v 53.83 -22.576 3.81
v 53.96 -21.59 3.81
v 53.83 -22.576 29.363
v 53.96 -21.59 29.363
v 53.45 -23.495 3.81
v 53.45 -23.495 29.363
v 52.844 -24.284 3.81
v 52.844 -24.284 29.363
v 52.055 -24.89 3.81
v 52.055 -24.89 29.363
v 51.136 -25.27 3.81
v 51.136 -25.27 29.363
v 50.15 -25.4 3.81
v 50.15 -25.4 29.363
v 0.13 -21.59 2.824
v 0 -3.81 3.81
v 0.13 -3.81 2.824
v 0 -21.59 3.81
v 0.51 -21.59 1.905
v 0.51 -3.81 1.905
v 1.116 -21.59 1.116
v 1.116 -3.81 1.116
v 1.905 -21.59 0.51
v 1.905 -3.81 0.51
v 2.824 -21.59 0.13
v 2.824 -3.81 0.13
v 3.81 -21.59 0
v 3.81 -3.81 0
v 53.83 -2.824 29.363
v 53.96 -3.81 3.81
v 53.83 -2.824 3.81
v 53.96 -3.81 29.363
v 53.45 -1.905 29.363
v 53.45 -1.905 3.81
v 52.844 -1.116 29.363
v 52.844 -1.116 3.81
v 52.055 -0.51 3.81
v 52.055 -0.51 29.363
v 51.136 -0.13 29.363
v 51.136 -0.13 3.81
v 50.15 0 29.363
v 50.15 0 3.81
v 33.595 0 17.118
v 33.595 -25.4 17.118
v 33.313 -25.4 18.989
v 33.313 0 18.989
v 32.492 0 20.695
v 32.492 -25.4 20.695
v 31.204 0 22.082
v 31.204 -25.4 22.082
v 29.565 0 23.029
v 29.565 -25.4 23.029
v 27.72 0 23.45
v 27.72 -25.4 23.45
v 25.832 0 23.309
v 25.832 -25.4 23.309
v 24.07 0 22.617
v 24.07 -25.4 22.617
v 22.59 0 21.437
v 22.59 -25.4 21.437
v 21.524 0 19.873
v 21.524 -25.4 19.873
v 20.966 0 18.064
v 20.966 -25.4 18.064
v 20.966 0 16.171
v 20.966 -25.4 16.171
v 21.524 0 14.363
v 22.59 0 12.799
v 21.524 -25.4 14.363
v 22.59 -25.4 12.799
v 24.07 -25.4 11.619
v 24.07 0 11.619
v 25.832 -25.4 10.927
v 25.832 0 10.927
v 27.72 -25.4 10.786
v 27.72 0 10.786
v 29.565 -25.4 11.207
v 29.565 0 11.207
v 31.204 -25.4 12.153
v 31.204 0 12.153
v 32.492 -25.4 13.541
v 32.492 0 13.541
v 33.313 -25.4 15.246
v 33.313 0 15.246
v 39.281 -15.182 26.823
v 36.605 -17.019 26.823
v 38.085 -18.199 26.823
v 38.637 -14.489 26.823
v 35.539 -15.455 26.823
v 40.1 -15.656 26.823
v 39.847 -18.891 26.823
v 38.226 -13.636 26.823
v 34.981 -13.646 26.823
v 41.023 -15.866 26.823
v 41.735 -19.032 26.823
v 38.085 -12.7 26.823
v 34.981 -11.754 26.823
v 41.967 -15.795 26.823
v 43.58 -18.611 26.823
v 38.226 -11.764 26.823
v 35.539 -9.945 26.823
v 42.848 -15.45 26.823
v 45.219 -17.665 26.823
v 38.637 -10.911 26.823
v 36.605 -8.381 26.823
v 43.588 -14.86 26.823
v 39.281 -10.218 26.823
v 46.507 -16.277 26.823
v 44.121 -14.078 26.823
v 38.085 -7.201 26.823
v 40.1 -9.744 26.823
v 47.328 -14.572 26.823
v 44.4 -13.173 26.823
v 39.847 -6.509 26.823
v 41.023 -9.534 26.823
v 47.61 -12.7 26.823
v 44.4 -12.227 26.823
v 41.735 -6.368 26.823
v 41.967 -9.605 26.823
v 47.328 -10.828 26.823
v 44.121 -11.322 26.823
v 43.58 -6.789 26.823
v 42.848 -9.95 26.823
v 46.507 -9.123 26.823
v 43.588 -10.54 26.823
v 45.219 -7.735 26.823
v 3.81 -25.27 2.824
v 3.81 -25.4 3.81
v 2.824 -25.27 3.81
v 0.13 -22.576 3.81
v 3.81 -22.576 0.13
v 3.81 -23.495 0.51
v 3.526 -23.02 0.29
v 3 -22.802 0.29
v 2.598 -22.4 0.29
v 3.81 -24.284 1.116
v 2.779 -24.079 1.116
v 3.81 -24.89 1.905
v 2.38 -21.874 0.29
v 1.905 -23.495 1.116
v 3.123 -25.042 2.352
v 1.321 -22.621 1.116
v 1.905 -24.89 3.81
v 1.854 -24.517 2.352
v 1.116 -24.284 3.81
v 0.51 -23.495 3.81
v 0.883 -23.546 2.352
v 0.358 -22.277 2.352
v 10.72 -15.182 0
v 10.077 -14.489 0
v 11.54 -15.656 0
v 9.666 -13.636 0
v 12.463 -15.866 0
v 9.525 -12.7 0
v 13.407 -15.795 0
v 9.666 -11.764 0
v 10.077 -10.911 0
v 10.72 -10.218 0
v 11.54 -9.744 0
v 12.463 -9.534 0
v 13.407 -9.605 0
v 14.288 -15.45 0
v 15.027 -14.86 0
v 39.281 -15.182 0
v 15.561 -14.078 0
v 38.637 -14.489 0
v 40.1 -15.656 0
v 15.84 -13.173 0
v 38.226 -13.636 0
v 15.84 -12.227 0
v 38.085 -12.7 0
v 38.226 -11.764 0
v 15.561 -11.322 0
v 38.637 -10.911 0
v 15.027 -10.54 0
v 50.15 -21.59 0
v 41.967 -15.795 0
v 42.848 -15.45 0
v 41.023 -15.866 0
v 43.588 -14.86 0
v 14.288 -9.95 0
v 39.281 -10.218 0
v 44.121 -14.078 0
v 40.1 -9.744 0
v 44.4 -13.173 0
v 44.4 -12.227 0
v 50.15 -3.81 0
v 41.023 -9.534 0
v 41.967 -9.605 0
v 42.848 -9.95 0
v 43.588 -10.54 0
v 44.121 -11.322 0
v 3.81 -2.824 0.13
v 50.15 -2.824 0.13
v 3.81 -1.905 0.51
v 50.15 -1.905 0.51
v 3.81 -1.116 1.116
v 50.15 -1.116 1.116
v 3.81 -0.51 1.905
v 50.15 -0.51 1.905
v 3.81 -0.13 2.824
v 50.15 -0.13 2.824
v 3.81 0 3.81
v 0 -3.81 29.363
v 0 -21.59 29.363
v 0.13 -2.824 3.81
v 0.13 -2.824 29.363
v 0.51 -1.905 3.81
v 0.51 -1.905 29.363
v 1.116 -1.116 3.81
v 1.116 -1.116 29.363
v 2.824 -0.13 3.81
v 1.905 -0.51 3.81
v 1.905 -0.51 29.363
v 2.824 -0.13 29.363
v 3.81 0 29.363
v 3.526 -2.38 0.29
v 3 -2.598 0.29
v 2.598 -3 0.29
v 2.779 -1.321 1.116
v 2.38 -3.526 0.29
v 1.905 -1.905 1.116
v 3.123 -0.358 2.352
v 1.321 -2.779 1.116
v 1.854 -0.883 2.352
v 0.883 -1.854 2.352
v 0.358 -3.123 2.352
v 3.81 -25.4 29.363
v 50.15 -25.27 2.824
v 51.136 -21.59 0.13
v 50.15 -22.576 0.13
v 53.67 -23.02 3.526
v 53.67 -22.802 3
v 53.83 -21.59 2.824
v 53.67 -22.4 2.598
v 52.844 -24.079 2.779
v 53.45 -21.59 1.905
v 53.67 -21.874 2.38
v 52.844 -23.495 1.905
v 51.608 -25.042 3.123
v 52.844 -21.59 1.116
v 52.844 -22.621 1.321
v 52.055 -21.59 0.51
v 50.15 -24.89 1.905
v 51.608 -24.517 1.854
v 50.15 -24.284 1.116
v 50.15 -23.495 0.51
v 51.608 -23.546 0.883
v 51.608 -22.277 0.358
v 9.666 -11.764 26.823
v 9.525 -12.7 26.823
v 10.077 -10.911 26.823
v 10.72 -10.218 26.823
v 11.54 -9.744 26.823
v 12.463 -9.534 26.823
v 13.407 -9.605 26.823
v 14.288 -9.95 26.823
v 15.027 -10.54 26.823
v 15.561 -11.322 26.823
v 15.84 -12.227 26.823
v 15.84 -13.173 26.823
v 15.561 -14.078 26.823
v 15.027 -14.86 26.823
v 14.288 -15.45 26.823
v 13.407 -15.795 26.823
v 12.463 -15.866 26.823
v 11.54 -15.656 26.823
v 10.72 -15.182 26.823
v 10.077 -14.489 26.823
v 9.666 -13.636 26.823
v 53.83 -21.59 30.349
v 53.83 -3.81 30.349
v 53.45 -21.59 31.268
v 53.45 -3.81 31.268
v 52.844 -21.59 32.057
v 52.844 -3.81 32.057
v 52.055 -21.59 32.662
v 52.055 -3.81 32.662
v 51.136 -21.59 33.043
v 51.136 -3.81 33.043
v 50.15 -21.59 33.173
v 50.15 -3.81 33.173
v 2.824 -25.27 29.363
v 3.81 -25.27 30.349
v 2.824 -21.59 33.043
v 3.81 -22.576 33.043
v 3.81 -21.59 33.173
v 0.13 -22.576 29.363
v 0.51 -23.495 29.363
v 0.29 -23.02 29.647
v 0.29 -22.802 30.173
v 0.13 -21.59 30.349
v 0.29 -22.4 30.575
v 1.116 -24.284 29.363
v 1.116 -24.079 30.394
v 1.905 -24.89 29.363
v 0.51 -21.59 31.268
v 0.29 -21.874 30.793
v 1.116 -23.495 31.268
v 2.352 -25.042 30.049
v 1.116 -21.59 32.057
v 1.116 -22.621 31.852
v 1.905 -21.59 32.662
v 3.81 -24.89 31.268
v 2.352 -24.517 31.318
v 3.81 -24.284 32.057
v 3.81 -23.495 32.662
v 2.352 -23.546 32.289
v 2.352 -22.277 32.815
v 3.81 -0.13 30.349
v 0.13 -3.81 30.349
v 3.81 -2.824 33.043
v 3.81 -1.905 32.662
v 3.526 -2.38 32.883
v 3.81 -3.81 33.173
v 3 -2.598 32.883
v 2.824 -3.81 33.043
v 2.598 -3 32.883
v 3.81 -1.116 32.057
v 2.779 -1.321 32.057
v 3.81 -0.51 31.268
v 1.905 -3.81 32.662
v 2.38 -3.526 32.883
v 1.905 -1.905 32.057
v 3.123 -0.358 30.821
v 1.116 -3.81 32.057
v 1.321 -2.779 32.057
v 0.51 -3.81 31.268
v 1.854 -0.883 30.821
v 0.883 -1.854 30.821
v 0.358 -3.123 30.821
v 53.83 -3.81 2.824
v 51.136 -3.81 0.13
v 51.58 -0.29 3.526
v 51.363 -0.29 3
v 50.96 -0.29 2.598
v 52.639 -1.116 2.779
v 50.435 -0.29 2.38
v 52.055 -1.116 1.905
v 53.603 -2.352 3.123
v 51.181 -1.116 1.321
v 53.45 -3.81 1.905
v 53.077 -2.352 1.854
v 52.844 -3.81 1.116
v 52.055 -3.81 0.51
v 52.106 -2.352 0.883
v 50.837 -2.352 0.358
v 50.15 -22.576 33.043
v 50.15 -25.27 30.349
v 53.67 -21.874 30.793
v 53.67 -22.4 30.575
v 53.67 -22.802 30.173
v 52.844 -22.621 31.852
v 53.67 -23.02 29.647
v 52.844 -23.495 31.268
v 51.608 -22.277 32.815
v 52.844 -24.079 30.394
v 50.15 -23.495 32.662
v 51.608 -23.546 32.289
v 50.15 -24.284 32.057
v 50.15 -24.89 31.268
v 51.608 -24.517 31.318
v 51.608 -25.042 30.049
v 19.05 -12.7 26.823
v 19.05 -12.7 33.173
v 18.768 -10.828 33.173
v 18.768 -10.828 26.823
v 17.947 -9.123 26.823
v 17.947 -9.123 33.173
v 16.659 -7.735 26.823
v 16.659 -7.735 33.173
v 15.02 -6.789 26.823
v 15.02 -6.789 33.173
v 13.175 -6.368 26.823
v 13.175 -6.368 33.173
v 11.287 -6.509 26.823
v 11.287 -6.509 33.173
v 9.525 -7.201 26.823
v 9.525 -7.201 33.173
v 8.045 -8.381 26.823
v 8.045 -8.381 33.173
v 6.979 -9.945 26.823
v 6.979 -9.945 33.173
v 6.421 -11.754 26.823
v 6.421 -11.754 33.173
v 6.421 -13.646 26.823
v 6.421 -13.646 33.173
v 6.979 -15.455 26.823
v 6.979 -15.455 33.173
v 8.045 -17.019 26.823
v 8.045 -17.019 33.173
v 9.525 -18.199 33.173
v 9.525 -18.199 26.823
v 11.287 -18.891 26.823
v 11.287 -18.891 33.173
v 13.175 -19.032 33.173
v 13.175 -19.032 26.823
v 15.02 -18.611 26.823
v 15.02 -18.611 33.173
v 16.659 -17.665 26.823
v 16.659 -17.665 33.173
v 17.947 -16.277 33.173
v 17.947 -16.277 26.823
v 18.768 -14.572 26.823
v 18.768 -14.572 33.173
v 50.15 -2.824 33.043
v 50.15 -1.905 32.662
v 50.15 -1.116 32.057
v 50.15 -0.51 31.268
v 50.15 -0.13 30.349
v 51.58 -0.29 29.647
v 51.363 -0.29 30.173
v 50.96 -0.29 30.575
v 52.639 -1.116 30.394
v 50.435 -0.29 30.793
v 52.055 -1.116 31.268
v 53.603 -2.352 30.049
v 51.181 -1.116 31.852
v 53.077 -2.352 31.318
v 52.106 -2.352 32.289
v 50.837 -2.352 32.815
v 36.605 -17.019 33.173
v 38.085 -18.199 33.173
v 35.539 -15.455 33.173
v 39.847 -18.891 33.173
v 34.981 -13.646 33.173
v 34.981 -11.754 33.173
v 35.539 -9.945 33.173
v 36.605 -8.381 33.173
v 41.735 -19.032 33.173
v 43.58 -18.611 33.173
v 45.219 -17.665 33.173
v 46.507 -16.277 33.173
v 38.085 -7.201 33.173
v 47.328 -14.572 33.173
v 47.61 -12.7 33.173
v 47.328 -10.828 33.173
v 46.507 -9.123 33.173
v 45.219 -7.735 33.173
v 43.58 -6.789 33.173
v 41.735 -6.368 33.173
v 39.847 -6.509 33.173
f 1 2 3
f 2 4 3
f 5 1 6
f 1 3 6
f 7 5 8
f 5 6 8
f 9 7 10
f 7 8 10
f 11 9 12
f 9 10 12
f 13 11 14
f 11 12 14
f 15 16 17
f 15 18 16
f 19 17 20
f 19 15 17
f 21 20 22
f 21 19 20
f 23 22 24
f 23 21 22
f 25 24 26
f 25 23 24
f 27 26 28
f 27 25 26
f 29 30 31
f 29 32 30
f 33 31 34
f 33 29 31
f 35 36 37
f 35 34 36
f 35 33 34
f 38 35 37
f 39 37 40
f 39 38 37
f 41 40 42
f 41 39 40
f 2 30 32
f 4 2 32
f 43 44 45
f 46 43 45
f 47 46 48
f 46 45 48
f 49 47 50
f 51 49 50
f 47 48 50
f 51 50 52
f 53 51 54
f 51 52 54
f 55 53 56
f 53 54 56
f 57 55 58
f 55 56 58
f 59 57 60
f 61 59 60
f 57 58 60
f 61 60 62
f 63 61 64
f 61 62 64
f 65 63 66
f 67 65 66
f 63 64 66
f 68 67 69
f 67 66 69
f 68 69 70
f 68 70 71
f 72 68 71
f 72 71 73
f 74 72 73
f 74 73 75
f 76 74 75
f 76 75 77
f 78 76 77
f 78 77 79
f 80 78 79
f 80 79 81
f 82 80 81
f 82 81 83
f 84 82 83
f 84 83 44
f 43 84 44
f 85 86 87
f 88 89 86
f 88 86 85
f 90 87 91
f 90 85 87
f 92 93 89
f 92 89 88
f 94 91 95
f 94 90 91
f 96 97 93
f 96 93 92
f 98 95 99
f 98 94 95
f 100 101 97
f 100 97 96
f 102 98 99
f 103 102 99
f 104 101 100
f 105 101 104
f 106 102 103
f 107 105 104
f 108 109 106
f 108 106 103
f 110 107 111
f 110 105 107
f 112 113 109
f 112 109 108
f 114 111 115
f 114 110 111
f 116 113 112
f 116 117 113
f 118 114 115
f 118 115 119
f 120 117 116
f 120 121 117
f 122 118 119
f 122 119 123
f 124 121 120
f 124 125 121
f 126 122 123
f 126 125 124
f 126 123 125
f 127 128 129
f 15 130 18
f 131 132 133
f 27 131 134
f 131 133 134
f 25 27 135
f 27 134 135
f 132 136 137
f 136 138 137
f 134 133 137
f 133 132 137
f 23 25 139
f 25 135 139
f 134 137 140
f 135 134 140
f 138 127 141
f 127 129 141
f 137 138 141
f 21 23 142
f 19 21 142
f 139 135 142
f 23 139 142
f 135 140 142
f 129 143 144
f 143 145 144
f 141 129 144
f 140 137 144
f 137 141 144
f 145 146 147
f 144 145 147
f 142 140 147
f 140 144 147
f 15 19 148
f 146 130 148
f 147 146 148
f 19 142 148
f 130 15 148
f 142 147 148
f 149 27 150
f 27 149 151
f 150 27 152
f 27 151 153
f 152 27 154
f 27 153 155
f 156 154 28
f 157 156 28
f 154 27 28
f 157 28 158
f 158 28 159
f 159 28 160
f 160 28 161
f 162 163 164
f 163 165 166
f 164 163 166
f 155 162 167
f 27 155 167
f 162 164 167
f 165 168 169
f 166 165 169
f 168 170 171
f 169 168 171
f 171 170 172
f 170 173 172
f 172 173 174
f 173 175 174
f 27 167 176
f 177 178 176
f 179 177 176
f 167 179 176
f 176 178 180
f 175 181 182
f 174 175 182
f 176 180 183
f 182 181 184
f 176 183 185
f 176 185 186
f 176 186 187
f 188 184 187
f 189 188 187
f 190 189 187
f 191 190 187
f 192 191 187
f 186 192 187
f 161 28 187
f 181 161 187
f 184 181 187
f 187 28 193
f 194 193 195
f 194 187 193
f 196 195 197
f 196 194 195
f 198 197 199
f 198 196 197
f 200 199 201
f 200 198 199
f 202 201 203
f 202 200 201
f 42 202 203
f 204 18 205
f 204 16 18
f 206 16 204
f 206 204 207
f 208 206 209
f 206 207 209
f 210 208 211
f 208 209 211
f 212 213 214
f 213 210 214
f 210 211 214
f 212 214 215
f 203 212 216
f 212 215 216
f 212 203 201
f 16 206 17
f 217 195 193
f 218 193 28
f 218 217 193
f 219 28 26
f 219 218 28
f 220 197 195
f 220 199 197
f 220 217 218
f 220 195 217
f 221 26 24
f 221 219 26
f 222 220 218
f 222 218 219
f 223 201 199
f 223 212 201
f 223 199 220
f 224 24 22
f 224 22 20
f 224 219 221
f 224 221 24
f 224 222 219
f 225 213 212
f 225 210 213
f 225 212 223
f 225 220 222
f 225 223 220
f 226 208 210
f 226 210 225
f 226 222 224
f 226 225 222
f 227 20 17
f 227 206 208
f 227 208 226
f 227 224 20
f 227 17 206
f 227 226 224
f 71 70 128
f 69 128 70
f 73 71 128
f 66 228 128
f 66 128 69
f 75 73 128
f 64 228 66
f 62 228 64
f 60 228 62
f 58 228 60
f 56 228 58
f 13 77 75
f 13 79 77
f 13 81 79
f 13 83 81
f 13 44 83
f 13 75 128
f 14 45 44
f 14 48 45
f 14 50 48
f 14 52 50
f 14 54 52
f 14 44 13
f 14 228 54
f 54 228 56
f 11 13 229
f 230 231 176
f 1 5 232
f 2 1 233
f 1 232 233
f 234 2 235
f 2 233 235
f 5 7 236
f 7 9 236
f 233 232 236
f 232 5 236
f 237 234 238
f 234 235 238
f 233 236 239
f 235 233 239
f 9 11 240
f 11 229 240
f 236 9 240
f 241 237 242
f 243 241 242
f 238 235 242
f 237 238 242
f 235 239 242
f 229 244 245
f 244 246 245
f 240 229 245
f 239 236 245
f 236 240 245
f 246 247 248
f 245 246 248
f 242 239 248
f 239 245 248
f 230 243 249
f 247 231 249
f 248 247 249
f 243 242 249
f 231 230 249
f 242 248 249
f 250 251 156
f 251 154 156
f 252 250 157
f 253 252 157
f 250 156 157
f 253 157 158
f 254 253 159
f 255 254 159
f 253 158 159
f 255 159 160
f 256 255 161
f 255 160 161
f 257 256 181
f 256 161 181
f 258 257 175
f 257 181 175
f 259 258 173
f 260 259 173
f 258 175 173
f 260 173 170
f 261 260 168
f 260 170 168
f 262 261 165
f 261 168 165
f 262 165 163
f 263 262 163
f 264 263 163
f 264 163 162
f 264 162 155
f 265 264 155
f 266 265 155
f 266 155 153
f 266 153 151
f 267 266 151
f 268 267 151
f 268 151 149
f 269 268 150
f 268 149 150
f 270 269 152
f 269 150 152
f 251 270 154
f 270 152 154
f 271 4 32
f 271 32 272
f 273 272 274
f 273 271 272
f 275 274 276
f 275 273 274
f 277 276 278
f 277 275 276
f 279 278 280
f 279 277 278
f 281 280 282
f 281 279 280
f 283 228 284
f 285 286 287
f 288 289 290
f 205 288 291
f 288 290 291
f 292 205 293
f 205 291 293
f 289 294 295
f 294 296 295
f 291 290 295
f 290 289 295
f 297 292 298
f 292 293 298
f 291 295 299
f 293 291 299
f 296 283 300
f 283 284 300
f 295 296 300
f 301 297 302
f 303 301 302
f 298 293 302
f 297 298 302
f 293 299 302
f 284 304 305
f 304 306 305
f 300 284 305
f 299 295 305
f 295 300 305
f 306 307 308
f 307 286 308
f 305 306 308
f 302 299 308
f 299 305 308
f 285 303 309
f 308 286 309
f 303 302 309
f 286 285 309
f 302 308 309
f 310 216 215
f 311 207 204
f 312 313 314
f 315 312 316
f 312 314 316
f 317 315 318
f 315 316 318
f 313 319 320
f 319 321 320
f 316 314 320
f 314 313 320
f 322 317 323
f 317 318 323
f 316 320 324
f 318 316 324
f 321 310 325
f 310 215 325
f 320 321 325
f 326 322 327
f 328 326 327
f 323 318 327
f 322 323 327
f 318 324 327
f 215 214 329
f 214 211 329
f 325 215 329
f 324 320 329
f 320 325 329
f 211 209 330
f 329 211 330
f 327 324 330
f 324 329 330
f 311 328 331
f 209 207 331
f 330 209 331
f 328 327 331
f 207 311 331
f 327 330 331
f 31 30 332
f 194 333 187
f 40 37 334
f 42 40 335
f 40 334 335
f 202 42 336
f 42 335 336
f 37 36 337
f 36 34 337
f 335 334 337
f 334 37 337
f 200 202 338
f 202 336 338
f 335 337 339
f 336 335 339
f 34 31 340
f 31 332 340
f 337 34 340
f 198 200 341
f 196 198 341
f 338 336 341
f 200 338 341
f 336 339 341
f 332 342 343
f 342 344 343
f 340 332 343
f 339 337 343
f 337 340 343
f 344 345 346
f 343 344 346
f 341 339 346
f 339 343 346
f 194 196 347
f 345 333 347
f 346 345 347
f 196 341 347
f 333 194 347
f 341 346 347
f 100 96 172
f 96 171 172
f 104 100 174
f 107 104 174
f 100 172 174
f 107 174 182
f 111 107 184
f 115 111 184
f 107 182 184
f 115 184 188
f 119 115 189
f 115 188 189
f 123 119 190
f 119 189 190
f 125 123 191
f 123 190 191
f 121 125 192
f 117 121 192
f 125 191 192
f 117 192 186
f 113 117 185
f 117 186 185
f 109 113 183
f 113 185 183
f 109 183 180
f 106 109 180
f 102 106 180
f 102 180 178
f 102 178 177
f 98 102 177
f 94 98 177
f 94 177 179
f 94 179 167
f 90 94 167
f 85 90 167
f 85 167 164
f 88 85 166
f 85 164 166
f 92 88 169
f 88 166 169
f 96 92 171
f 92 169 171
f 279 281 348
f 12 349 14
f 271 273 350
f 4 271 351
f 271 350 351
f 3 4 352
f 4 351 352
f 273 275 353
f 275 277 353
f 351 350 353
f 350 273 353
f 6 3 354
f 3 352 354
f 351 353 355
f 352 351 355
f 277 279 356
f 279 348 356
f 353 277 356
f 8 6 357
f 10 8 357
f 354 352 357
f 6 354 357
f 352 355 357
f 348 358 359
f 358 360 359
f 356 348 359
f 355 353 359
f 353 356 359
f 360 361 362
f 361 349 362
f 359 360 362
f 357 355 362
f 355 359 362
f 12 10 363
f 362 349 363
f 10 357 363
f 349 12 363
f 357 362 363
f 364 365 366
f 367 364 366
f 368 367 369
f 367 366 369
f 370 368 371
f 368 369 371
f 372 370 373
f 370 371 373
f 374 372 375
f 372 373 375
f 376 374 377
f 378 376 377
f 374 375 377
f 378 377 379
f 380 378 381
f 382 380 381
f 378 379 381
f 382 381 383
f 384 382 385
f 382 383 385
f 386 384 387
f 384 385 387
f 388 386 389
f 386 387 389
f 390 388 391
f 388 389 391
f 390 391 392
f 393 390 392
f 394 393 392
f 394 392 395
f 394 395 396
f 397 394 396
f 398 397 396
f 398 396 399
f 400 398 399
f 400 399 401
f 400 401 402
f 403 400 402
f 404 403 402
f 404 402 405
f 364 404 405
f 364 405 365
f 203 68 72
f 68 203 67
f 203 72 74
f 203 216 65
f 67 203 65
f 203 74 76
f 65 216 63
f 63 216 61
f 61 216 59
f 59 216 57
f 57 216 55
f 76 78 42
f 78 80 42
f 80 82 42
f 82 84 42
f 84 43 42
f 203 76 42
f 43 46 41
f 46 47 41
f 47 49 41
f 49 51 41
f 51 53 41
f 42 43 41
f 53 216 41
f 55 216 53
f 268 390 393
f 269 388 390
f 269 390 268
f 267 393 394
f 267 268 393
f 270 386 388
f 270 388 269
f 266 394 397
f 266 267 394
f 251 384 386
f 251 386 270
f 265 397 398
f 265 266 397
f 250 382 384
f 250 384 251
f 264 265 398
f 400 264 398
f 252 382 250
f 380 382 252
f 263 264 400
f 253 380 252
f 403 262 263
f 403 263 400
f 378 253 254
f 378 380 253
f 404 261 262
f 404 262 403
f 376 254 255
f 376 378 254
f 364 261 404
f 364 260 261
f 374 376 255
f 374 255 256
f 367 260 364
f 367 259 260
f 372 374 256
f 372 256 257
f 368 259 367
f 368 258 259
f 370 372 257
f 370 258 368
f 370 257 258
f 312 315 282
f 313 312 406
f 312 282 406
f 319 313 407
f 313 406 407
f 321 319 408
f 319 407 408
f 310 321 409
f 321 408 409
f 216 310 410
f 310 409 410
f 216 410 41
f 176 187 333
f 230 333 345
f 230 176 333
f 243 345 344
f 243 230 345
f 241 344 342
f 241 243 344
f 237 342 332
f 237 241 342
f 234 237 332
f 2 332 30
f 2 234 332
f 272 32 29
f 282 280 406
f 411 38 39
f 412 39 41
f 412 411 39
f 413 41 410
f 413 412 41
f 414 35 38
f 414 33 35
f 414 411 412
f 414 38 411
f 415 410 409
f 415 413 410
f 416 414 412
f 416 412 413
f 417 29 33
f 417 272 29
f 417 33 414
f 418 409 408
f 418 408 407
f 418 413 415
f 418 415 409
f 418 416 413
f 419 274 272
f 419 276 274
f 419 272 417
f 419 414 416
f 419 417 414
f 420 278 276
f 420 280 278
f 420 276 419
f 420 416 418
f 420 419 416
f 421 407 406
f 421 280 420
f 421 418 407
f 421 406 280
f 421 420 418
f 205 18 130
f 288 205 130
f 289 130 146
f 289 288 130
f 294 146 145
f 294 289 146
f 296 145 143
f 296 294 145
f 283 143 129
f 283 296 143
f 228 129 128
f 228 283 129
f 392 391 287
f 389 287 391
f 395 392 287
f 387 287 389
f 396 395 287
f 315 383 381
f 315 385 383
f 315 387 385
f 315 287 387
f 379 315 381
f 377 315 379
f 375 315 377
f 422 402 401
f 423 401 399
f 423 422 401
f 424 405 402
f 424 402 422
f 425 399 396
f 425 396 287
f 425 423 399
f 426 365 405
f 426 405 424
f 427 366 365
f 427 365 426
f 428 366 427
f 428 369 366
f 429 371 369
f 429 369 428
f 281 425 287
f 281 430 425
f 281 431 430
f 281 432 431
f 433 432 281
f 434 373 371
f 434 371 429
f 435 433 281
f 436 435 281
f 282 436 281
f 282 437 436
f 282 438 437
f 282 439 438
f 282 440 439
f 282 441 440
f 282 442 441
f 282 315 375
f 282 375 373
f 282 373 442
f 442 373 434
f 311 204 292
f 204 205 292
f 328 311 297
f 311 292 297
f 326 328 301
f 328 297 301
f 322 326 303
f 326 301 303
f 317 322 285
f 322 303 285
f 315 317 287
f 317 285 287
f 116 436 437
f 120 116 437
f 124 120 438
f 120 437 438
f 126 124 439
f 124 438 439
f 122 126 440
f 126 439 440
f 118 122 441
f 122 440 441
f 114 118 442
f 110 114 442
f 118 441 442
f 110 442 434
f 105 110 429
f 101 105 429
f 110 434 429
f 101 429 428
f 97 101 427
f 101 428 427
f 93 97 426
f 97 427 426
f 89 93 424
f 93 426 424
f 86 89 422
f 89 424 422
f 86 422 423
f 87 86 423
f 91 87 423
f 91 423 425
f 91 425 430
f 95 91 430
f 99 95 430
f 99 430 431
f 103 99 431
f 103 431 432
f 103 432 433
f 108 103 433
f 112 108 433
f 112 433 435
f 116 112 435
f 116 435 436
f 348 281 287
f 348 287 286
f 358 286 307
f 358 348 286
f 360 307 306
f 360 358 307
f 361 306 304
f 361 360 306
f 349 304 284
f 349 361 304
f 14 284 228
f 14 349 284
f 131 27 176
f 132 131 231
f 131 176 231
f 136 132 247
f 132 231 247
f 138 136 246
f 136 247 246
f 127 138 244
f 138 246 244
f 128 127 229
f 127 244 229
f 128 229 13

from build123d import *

# Parameters (mm, degrees)
F0_W           = 53.960219
F0_H           = 33.172701
F1_DEPTH       = 25.4
F2_R           = 3.81
F3_R           = 6.35
F4_DEPTH       = 25.401
F6_D           = 6.35
F6_CBORE_D     = 12.7
F6_CBORE_DEPTH = 6.35


with BuildPart() as f1:
    # F0 (on Front) → F1 (new body)
    with BuildSketch(Plane.XZ):
        with Locations((26.980109, 16.58635)):
            Rectangle(F0_W, F0_H)
    extrude(amount=F1_DEPTH)

    # F2
    f2_edges = [f1.edges().sort_by_distance(p)[0] for p in [
        (26.98011, -25.4, 33.172701),
        (53.960219, -12.7, 33.172701),
        (0, -25.4, 16.58635),
        (26.98011, -25.4, 0),
        (53.960219, -25.4, 16.58635),
        (53.960219, -12.7, 0),
        (53.960219, 0, 16.58635),
        (0, 0, 16.58635),
        (26.98011, 0, 0),
        (26.98011, 0, 33.172701),
        (0, -12.7, 33.172701),
        (0, -12.7, 0),
    ]]
    fillet(f2_edges, radius=F2_R)

    # F3 (on face) → F4 (cut, through all)
    with BuildSketch(Plane.XZ.offset(25.4)):
        with Locations((27.24513, 17.117795)):
            Circle(F3_R)
    extrude(amount=-F4_DEPTH, mode=Mode.SUBTRACT)

    # F6 (through all)
    with Locations(Plane.XY.offset(33.172701)):
        with Locations((12.7, -12.7), (41.260219, -12.7)):
            CounterBoreHole(F6_D / 2, F6_CBORE_D / 2, F6_CBORE_DEPTH)


solid = f1.part
